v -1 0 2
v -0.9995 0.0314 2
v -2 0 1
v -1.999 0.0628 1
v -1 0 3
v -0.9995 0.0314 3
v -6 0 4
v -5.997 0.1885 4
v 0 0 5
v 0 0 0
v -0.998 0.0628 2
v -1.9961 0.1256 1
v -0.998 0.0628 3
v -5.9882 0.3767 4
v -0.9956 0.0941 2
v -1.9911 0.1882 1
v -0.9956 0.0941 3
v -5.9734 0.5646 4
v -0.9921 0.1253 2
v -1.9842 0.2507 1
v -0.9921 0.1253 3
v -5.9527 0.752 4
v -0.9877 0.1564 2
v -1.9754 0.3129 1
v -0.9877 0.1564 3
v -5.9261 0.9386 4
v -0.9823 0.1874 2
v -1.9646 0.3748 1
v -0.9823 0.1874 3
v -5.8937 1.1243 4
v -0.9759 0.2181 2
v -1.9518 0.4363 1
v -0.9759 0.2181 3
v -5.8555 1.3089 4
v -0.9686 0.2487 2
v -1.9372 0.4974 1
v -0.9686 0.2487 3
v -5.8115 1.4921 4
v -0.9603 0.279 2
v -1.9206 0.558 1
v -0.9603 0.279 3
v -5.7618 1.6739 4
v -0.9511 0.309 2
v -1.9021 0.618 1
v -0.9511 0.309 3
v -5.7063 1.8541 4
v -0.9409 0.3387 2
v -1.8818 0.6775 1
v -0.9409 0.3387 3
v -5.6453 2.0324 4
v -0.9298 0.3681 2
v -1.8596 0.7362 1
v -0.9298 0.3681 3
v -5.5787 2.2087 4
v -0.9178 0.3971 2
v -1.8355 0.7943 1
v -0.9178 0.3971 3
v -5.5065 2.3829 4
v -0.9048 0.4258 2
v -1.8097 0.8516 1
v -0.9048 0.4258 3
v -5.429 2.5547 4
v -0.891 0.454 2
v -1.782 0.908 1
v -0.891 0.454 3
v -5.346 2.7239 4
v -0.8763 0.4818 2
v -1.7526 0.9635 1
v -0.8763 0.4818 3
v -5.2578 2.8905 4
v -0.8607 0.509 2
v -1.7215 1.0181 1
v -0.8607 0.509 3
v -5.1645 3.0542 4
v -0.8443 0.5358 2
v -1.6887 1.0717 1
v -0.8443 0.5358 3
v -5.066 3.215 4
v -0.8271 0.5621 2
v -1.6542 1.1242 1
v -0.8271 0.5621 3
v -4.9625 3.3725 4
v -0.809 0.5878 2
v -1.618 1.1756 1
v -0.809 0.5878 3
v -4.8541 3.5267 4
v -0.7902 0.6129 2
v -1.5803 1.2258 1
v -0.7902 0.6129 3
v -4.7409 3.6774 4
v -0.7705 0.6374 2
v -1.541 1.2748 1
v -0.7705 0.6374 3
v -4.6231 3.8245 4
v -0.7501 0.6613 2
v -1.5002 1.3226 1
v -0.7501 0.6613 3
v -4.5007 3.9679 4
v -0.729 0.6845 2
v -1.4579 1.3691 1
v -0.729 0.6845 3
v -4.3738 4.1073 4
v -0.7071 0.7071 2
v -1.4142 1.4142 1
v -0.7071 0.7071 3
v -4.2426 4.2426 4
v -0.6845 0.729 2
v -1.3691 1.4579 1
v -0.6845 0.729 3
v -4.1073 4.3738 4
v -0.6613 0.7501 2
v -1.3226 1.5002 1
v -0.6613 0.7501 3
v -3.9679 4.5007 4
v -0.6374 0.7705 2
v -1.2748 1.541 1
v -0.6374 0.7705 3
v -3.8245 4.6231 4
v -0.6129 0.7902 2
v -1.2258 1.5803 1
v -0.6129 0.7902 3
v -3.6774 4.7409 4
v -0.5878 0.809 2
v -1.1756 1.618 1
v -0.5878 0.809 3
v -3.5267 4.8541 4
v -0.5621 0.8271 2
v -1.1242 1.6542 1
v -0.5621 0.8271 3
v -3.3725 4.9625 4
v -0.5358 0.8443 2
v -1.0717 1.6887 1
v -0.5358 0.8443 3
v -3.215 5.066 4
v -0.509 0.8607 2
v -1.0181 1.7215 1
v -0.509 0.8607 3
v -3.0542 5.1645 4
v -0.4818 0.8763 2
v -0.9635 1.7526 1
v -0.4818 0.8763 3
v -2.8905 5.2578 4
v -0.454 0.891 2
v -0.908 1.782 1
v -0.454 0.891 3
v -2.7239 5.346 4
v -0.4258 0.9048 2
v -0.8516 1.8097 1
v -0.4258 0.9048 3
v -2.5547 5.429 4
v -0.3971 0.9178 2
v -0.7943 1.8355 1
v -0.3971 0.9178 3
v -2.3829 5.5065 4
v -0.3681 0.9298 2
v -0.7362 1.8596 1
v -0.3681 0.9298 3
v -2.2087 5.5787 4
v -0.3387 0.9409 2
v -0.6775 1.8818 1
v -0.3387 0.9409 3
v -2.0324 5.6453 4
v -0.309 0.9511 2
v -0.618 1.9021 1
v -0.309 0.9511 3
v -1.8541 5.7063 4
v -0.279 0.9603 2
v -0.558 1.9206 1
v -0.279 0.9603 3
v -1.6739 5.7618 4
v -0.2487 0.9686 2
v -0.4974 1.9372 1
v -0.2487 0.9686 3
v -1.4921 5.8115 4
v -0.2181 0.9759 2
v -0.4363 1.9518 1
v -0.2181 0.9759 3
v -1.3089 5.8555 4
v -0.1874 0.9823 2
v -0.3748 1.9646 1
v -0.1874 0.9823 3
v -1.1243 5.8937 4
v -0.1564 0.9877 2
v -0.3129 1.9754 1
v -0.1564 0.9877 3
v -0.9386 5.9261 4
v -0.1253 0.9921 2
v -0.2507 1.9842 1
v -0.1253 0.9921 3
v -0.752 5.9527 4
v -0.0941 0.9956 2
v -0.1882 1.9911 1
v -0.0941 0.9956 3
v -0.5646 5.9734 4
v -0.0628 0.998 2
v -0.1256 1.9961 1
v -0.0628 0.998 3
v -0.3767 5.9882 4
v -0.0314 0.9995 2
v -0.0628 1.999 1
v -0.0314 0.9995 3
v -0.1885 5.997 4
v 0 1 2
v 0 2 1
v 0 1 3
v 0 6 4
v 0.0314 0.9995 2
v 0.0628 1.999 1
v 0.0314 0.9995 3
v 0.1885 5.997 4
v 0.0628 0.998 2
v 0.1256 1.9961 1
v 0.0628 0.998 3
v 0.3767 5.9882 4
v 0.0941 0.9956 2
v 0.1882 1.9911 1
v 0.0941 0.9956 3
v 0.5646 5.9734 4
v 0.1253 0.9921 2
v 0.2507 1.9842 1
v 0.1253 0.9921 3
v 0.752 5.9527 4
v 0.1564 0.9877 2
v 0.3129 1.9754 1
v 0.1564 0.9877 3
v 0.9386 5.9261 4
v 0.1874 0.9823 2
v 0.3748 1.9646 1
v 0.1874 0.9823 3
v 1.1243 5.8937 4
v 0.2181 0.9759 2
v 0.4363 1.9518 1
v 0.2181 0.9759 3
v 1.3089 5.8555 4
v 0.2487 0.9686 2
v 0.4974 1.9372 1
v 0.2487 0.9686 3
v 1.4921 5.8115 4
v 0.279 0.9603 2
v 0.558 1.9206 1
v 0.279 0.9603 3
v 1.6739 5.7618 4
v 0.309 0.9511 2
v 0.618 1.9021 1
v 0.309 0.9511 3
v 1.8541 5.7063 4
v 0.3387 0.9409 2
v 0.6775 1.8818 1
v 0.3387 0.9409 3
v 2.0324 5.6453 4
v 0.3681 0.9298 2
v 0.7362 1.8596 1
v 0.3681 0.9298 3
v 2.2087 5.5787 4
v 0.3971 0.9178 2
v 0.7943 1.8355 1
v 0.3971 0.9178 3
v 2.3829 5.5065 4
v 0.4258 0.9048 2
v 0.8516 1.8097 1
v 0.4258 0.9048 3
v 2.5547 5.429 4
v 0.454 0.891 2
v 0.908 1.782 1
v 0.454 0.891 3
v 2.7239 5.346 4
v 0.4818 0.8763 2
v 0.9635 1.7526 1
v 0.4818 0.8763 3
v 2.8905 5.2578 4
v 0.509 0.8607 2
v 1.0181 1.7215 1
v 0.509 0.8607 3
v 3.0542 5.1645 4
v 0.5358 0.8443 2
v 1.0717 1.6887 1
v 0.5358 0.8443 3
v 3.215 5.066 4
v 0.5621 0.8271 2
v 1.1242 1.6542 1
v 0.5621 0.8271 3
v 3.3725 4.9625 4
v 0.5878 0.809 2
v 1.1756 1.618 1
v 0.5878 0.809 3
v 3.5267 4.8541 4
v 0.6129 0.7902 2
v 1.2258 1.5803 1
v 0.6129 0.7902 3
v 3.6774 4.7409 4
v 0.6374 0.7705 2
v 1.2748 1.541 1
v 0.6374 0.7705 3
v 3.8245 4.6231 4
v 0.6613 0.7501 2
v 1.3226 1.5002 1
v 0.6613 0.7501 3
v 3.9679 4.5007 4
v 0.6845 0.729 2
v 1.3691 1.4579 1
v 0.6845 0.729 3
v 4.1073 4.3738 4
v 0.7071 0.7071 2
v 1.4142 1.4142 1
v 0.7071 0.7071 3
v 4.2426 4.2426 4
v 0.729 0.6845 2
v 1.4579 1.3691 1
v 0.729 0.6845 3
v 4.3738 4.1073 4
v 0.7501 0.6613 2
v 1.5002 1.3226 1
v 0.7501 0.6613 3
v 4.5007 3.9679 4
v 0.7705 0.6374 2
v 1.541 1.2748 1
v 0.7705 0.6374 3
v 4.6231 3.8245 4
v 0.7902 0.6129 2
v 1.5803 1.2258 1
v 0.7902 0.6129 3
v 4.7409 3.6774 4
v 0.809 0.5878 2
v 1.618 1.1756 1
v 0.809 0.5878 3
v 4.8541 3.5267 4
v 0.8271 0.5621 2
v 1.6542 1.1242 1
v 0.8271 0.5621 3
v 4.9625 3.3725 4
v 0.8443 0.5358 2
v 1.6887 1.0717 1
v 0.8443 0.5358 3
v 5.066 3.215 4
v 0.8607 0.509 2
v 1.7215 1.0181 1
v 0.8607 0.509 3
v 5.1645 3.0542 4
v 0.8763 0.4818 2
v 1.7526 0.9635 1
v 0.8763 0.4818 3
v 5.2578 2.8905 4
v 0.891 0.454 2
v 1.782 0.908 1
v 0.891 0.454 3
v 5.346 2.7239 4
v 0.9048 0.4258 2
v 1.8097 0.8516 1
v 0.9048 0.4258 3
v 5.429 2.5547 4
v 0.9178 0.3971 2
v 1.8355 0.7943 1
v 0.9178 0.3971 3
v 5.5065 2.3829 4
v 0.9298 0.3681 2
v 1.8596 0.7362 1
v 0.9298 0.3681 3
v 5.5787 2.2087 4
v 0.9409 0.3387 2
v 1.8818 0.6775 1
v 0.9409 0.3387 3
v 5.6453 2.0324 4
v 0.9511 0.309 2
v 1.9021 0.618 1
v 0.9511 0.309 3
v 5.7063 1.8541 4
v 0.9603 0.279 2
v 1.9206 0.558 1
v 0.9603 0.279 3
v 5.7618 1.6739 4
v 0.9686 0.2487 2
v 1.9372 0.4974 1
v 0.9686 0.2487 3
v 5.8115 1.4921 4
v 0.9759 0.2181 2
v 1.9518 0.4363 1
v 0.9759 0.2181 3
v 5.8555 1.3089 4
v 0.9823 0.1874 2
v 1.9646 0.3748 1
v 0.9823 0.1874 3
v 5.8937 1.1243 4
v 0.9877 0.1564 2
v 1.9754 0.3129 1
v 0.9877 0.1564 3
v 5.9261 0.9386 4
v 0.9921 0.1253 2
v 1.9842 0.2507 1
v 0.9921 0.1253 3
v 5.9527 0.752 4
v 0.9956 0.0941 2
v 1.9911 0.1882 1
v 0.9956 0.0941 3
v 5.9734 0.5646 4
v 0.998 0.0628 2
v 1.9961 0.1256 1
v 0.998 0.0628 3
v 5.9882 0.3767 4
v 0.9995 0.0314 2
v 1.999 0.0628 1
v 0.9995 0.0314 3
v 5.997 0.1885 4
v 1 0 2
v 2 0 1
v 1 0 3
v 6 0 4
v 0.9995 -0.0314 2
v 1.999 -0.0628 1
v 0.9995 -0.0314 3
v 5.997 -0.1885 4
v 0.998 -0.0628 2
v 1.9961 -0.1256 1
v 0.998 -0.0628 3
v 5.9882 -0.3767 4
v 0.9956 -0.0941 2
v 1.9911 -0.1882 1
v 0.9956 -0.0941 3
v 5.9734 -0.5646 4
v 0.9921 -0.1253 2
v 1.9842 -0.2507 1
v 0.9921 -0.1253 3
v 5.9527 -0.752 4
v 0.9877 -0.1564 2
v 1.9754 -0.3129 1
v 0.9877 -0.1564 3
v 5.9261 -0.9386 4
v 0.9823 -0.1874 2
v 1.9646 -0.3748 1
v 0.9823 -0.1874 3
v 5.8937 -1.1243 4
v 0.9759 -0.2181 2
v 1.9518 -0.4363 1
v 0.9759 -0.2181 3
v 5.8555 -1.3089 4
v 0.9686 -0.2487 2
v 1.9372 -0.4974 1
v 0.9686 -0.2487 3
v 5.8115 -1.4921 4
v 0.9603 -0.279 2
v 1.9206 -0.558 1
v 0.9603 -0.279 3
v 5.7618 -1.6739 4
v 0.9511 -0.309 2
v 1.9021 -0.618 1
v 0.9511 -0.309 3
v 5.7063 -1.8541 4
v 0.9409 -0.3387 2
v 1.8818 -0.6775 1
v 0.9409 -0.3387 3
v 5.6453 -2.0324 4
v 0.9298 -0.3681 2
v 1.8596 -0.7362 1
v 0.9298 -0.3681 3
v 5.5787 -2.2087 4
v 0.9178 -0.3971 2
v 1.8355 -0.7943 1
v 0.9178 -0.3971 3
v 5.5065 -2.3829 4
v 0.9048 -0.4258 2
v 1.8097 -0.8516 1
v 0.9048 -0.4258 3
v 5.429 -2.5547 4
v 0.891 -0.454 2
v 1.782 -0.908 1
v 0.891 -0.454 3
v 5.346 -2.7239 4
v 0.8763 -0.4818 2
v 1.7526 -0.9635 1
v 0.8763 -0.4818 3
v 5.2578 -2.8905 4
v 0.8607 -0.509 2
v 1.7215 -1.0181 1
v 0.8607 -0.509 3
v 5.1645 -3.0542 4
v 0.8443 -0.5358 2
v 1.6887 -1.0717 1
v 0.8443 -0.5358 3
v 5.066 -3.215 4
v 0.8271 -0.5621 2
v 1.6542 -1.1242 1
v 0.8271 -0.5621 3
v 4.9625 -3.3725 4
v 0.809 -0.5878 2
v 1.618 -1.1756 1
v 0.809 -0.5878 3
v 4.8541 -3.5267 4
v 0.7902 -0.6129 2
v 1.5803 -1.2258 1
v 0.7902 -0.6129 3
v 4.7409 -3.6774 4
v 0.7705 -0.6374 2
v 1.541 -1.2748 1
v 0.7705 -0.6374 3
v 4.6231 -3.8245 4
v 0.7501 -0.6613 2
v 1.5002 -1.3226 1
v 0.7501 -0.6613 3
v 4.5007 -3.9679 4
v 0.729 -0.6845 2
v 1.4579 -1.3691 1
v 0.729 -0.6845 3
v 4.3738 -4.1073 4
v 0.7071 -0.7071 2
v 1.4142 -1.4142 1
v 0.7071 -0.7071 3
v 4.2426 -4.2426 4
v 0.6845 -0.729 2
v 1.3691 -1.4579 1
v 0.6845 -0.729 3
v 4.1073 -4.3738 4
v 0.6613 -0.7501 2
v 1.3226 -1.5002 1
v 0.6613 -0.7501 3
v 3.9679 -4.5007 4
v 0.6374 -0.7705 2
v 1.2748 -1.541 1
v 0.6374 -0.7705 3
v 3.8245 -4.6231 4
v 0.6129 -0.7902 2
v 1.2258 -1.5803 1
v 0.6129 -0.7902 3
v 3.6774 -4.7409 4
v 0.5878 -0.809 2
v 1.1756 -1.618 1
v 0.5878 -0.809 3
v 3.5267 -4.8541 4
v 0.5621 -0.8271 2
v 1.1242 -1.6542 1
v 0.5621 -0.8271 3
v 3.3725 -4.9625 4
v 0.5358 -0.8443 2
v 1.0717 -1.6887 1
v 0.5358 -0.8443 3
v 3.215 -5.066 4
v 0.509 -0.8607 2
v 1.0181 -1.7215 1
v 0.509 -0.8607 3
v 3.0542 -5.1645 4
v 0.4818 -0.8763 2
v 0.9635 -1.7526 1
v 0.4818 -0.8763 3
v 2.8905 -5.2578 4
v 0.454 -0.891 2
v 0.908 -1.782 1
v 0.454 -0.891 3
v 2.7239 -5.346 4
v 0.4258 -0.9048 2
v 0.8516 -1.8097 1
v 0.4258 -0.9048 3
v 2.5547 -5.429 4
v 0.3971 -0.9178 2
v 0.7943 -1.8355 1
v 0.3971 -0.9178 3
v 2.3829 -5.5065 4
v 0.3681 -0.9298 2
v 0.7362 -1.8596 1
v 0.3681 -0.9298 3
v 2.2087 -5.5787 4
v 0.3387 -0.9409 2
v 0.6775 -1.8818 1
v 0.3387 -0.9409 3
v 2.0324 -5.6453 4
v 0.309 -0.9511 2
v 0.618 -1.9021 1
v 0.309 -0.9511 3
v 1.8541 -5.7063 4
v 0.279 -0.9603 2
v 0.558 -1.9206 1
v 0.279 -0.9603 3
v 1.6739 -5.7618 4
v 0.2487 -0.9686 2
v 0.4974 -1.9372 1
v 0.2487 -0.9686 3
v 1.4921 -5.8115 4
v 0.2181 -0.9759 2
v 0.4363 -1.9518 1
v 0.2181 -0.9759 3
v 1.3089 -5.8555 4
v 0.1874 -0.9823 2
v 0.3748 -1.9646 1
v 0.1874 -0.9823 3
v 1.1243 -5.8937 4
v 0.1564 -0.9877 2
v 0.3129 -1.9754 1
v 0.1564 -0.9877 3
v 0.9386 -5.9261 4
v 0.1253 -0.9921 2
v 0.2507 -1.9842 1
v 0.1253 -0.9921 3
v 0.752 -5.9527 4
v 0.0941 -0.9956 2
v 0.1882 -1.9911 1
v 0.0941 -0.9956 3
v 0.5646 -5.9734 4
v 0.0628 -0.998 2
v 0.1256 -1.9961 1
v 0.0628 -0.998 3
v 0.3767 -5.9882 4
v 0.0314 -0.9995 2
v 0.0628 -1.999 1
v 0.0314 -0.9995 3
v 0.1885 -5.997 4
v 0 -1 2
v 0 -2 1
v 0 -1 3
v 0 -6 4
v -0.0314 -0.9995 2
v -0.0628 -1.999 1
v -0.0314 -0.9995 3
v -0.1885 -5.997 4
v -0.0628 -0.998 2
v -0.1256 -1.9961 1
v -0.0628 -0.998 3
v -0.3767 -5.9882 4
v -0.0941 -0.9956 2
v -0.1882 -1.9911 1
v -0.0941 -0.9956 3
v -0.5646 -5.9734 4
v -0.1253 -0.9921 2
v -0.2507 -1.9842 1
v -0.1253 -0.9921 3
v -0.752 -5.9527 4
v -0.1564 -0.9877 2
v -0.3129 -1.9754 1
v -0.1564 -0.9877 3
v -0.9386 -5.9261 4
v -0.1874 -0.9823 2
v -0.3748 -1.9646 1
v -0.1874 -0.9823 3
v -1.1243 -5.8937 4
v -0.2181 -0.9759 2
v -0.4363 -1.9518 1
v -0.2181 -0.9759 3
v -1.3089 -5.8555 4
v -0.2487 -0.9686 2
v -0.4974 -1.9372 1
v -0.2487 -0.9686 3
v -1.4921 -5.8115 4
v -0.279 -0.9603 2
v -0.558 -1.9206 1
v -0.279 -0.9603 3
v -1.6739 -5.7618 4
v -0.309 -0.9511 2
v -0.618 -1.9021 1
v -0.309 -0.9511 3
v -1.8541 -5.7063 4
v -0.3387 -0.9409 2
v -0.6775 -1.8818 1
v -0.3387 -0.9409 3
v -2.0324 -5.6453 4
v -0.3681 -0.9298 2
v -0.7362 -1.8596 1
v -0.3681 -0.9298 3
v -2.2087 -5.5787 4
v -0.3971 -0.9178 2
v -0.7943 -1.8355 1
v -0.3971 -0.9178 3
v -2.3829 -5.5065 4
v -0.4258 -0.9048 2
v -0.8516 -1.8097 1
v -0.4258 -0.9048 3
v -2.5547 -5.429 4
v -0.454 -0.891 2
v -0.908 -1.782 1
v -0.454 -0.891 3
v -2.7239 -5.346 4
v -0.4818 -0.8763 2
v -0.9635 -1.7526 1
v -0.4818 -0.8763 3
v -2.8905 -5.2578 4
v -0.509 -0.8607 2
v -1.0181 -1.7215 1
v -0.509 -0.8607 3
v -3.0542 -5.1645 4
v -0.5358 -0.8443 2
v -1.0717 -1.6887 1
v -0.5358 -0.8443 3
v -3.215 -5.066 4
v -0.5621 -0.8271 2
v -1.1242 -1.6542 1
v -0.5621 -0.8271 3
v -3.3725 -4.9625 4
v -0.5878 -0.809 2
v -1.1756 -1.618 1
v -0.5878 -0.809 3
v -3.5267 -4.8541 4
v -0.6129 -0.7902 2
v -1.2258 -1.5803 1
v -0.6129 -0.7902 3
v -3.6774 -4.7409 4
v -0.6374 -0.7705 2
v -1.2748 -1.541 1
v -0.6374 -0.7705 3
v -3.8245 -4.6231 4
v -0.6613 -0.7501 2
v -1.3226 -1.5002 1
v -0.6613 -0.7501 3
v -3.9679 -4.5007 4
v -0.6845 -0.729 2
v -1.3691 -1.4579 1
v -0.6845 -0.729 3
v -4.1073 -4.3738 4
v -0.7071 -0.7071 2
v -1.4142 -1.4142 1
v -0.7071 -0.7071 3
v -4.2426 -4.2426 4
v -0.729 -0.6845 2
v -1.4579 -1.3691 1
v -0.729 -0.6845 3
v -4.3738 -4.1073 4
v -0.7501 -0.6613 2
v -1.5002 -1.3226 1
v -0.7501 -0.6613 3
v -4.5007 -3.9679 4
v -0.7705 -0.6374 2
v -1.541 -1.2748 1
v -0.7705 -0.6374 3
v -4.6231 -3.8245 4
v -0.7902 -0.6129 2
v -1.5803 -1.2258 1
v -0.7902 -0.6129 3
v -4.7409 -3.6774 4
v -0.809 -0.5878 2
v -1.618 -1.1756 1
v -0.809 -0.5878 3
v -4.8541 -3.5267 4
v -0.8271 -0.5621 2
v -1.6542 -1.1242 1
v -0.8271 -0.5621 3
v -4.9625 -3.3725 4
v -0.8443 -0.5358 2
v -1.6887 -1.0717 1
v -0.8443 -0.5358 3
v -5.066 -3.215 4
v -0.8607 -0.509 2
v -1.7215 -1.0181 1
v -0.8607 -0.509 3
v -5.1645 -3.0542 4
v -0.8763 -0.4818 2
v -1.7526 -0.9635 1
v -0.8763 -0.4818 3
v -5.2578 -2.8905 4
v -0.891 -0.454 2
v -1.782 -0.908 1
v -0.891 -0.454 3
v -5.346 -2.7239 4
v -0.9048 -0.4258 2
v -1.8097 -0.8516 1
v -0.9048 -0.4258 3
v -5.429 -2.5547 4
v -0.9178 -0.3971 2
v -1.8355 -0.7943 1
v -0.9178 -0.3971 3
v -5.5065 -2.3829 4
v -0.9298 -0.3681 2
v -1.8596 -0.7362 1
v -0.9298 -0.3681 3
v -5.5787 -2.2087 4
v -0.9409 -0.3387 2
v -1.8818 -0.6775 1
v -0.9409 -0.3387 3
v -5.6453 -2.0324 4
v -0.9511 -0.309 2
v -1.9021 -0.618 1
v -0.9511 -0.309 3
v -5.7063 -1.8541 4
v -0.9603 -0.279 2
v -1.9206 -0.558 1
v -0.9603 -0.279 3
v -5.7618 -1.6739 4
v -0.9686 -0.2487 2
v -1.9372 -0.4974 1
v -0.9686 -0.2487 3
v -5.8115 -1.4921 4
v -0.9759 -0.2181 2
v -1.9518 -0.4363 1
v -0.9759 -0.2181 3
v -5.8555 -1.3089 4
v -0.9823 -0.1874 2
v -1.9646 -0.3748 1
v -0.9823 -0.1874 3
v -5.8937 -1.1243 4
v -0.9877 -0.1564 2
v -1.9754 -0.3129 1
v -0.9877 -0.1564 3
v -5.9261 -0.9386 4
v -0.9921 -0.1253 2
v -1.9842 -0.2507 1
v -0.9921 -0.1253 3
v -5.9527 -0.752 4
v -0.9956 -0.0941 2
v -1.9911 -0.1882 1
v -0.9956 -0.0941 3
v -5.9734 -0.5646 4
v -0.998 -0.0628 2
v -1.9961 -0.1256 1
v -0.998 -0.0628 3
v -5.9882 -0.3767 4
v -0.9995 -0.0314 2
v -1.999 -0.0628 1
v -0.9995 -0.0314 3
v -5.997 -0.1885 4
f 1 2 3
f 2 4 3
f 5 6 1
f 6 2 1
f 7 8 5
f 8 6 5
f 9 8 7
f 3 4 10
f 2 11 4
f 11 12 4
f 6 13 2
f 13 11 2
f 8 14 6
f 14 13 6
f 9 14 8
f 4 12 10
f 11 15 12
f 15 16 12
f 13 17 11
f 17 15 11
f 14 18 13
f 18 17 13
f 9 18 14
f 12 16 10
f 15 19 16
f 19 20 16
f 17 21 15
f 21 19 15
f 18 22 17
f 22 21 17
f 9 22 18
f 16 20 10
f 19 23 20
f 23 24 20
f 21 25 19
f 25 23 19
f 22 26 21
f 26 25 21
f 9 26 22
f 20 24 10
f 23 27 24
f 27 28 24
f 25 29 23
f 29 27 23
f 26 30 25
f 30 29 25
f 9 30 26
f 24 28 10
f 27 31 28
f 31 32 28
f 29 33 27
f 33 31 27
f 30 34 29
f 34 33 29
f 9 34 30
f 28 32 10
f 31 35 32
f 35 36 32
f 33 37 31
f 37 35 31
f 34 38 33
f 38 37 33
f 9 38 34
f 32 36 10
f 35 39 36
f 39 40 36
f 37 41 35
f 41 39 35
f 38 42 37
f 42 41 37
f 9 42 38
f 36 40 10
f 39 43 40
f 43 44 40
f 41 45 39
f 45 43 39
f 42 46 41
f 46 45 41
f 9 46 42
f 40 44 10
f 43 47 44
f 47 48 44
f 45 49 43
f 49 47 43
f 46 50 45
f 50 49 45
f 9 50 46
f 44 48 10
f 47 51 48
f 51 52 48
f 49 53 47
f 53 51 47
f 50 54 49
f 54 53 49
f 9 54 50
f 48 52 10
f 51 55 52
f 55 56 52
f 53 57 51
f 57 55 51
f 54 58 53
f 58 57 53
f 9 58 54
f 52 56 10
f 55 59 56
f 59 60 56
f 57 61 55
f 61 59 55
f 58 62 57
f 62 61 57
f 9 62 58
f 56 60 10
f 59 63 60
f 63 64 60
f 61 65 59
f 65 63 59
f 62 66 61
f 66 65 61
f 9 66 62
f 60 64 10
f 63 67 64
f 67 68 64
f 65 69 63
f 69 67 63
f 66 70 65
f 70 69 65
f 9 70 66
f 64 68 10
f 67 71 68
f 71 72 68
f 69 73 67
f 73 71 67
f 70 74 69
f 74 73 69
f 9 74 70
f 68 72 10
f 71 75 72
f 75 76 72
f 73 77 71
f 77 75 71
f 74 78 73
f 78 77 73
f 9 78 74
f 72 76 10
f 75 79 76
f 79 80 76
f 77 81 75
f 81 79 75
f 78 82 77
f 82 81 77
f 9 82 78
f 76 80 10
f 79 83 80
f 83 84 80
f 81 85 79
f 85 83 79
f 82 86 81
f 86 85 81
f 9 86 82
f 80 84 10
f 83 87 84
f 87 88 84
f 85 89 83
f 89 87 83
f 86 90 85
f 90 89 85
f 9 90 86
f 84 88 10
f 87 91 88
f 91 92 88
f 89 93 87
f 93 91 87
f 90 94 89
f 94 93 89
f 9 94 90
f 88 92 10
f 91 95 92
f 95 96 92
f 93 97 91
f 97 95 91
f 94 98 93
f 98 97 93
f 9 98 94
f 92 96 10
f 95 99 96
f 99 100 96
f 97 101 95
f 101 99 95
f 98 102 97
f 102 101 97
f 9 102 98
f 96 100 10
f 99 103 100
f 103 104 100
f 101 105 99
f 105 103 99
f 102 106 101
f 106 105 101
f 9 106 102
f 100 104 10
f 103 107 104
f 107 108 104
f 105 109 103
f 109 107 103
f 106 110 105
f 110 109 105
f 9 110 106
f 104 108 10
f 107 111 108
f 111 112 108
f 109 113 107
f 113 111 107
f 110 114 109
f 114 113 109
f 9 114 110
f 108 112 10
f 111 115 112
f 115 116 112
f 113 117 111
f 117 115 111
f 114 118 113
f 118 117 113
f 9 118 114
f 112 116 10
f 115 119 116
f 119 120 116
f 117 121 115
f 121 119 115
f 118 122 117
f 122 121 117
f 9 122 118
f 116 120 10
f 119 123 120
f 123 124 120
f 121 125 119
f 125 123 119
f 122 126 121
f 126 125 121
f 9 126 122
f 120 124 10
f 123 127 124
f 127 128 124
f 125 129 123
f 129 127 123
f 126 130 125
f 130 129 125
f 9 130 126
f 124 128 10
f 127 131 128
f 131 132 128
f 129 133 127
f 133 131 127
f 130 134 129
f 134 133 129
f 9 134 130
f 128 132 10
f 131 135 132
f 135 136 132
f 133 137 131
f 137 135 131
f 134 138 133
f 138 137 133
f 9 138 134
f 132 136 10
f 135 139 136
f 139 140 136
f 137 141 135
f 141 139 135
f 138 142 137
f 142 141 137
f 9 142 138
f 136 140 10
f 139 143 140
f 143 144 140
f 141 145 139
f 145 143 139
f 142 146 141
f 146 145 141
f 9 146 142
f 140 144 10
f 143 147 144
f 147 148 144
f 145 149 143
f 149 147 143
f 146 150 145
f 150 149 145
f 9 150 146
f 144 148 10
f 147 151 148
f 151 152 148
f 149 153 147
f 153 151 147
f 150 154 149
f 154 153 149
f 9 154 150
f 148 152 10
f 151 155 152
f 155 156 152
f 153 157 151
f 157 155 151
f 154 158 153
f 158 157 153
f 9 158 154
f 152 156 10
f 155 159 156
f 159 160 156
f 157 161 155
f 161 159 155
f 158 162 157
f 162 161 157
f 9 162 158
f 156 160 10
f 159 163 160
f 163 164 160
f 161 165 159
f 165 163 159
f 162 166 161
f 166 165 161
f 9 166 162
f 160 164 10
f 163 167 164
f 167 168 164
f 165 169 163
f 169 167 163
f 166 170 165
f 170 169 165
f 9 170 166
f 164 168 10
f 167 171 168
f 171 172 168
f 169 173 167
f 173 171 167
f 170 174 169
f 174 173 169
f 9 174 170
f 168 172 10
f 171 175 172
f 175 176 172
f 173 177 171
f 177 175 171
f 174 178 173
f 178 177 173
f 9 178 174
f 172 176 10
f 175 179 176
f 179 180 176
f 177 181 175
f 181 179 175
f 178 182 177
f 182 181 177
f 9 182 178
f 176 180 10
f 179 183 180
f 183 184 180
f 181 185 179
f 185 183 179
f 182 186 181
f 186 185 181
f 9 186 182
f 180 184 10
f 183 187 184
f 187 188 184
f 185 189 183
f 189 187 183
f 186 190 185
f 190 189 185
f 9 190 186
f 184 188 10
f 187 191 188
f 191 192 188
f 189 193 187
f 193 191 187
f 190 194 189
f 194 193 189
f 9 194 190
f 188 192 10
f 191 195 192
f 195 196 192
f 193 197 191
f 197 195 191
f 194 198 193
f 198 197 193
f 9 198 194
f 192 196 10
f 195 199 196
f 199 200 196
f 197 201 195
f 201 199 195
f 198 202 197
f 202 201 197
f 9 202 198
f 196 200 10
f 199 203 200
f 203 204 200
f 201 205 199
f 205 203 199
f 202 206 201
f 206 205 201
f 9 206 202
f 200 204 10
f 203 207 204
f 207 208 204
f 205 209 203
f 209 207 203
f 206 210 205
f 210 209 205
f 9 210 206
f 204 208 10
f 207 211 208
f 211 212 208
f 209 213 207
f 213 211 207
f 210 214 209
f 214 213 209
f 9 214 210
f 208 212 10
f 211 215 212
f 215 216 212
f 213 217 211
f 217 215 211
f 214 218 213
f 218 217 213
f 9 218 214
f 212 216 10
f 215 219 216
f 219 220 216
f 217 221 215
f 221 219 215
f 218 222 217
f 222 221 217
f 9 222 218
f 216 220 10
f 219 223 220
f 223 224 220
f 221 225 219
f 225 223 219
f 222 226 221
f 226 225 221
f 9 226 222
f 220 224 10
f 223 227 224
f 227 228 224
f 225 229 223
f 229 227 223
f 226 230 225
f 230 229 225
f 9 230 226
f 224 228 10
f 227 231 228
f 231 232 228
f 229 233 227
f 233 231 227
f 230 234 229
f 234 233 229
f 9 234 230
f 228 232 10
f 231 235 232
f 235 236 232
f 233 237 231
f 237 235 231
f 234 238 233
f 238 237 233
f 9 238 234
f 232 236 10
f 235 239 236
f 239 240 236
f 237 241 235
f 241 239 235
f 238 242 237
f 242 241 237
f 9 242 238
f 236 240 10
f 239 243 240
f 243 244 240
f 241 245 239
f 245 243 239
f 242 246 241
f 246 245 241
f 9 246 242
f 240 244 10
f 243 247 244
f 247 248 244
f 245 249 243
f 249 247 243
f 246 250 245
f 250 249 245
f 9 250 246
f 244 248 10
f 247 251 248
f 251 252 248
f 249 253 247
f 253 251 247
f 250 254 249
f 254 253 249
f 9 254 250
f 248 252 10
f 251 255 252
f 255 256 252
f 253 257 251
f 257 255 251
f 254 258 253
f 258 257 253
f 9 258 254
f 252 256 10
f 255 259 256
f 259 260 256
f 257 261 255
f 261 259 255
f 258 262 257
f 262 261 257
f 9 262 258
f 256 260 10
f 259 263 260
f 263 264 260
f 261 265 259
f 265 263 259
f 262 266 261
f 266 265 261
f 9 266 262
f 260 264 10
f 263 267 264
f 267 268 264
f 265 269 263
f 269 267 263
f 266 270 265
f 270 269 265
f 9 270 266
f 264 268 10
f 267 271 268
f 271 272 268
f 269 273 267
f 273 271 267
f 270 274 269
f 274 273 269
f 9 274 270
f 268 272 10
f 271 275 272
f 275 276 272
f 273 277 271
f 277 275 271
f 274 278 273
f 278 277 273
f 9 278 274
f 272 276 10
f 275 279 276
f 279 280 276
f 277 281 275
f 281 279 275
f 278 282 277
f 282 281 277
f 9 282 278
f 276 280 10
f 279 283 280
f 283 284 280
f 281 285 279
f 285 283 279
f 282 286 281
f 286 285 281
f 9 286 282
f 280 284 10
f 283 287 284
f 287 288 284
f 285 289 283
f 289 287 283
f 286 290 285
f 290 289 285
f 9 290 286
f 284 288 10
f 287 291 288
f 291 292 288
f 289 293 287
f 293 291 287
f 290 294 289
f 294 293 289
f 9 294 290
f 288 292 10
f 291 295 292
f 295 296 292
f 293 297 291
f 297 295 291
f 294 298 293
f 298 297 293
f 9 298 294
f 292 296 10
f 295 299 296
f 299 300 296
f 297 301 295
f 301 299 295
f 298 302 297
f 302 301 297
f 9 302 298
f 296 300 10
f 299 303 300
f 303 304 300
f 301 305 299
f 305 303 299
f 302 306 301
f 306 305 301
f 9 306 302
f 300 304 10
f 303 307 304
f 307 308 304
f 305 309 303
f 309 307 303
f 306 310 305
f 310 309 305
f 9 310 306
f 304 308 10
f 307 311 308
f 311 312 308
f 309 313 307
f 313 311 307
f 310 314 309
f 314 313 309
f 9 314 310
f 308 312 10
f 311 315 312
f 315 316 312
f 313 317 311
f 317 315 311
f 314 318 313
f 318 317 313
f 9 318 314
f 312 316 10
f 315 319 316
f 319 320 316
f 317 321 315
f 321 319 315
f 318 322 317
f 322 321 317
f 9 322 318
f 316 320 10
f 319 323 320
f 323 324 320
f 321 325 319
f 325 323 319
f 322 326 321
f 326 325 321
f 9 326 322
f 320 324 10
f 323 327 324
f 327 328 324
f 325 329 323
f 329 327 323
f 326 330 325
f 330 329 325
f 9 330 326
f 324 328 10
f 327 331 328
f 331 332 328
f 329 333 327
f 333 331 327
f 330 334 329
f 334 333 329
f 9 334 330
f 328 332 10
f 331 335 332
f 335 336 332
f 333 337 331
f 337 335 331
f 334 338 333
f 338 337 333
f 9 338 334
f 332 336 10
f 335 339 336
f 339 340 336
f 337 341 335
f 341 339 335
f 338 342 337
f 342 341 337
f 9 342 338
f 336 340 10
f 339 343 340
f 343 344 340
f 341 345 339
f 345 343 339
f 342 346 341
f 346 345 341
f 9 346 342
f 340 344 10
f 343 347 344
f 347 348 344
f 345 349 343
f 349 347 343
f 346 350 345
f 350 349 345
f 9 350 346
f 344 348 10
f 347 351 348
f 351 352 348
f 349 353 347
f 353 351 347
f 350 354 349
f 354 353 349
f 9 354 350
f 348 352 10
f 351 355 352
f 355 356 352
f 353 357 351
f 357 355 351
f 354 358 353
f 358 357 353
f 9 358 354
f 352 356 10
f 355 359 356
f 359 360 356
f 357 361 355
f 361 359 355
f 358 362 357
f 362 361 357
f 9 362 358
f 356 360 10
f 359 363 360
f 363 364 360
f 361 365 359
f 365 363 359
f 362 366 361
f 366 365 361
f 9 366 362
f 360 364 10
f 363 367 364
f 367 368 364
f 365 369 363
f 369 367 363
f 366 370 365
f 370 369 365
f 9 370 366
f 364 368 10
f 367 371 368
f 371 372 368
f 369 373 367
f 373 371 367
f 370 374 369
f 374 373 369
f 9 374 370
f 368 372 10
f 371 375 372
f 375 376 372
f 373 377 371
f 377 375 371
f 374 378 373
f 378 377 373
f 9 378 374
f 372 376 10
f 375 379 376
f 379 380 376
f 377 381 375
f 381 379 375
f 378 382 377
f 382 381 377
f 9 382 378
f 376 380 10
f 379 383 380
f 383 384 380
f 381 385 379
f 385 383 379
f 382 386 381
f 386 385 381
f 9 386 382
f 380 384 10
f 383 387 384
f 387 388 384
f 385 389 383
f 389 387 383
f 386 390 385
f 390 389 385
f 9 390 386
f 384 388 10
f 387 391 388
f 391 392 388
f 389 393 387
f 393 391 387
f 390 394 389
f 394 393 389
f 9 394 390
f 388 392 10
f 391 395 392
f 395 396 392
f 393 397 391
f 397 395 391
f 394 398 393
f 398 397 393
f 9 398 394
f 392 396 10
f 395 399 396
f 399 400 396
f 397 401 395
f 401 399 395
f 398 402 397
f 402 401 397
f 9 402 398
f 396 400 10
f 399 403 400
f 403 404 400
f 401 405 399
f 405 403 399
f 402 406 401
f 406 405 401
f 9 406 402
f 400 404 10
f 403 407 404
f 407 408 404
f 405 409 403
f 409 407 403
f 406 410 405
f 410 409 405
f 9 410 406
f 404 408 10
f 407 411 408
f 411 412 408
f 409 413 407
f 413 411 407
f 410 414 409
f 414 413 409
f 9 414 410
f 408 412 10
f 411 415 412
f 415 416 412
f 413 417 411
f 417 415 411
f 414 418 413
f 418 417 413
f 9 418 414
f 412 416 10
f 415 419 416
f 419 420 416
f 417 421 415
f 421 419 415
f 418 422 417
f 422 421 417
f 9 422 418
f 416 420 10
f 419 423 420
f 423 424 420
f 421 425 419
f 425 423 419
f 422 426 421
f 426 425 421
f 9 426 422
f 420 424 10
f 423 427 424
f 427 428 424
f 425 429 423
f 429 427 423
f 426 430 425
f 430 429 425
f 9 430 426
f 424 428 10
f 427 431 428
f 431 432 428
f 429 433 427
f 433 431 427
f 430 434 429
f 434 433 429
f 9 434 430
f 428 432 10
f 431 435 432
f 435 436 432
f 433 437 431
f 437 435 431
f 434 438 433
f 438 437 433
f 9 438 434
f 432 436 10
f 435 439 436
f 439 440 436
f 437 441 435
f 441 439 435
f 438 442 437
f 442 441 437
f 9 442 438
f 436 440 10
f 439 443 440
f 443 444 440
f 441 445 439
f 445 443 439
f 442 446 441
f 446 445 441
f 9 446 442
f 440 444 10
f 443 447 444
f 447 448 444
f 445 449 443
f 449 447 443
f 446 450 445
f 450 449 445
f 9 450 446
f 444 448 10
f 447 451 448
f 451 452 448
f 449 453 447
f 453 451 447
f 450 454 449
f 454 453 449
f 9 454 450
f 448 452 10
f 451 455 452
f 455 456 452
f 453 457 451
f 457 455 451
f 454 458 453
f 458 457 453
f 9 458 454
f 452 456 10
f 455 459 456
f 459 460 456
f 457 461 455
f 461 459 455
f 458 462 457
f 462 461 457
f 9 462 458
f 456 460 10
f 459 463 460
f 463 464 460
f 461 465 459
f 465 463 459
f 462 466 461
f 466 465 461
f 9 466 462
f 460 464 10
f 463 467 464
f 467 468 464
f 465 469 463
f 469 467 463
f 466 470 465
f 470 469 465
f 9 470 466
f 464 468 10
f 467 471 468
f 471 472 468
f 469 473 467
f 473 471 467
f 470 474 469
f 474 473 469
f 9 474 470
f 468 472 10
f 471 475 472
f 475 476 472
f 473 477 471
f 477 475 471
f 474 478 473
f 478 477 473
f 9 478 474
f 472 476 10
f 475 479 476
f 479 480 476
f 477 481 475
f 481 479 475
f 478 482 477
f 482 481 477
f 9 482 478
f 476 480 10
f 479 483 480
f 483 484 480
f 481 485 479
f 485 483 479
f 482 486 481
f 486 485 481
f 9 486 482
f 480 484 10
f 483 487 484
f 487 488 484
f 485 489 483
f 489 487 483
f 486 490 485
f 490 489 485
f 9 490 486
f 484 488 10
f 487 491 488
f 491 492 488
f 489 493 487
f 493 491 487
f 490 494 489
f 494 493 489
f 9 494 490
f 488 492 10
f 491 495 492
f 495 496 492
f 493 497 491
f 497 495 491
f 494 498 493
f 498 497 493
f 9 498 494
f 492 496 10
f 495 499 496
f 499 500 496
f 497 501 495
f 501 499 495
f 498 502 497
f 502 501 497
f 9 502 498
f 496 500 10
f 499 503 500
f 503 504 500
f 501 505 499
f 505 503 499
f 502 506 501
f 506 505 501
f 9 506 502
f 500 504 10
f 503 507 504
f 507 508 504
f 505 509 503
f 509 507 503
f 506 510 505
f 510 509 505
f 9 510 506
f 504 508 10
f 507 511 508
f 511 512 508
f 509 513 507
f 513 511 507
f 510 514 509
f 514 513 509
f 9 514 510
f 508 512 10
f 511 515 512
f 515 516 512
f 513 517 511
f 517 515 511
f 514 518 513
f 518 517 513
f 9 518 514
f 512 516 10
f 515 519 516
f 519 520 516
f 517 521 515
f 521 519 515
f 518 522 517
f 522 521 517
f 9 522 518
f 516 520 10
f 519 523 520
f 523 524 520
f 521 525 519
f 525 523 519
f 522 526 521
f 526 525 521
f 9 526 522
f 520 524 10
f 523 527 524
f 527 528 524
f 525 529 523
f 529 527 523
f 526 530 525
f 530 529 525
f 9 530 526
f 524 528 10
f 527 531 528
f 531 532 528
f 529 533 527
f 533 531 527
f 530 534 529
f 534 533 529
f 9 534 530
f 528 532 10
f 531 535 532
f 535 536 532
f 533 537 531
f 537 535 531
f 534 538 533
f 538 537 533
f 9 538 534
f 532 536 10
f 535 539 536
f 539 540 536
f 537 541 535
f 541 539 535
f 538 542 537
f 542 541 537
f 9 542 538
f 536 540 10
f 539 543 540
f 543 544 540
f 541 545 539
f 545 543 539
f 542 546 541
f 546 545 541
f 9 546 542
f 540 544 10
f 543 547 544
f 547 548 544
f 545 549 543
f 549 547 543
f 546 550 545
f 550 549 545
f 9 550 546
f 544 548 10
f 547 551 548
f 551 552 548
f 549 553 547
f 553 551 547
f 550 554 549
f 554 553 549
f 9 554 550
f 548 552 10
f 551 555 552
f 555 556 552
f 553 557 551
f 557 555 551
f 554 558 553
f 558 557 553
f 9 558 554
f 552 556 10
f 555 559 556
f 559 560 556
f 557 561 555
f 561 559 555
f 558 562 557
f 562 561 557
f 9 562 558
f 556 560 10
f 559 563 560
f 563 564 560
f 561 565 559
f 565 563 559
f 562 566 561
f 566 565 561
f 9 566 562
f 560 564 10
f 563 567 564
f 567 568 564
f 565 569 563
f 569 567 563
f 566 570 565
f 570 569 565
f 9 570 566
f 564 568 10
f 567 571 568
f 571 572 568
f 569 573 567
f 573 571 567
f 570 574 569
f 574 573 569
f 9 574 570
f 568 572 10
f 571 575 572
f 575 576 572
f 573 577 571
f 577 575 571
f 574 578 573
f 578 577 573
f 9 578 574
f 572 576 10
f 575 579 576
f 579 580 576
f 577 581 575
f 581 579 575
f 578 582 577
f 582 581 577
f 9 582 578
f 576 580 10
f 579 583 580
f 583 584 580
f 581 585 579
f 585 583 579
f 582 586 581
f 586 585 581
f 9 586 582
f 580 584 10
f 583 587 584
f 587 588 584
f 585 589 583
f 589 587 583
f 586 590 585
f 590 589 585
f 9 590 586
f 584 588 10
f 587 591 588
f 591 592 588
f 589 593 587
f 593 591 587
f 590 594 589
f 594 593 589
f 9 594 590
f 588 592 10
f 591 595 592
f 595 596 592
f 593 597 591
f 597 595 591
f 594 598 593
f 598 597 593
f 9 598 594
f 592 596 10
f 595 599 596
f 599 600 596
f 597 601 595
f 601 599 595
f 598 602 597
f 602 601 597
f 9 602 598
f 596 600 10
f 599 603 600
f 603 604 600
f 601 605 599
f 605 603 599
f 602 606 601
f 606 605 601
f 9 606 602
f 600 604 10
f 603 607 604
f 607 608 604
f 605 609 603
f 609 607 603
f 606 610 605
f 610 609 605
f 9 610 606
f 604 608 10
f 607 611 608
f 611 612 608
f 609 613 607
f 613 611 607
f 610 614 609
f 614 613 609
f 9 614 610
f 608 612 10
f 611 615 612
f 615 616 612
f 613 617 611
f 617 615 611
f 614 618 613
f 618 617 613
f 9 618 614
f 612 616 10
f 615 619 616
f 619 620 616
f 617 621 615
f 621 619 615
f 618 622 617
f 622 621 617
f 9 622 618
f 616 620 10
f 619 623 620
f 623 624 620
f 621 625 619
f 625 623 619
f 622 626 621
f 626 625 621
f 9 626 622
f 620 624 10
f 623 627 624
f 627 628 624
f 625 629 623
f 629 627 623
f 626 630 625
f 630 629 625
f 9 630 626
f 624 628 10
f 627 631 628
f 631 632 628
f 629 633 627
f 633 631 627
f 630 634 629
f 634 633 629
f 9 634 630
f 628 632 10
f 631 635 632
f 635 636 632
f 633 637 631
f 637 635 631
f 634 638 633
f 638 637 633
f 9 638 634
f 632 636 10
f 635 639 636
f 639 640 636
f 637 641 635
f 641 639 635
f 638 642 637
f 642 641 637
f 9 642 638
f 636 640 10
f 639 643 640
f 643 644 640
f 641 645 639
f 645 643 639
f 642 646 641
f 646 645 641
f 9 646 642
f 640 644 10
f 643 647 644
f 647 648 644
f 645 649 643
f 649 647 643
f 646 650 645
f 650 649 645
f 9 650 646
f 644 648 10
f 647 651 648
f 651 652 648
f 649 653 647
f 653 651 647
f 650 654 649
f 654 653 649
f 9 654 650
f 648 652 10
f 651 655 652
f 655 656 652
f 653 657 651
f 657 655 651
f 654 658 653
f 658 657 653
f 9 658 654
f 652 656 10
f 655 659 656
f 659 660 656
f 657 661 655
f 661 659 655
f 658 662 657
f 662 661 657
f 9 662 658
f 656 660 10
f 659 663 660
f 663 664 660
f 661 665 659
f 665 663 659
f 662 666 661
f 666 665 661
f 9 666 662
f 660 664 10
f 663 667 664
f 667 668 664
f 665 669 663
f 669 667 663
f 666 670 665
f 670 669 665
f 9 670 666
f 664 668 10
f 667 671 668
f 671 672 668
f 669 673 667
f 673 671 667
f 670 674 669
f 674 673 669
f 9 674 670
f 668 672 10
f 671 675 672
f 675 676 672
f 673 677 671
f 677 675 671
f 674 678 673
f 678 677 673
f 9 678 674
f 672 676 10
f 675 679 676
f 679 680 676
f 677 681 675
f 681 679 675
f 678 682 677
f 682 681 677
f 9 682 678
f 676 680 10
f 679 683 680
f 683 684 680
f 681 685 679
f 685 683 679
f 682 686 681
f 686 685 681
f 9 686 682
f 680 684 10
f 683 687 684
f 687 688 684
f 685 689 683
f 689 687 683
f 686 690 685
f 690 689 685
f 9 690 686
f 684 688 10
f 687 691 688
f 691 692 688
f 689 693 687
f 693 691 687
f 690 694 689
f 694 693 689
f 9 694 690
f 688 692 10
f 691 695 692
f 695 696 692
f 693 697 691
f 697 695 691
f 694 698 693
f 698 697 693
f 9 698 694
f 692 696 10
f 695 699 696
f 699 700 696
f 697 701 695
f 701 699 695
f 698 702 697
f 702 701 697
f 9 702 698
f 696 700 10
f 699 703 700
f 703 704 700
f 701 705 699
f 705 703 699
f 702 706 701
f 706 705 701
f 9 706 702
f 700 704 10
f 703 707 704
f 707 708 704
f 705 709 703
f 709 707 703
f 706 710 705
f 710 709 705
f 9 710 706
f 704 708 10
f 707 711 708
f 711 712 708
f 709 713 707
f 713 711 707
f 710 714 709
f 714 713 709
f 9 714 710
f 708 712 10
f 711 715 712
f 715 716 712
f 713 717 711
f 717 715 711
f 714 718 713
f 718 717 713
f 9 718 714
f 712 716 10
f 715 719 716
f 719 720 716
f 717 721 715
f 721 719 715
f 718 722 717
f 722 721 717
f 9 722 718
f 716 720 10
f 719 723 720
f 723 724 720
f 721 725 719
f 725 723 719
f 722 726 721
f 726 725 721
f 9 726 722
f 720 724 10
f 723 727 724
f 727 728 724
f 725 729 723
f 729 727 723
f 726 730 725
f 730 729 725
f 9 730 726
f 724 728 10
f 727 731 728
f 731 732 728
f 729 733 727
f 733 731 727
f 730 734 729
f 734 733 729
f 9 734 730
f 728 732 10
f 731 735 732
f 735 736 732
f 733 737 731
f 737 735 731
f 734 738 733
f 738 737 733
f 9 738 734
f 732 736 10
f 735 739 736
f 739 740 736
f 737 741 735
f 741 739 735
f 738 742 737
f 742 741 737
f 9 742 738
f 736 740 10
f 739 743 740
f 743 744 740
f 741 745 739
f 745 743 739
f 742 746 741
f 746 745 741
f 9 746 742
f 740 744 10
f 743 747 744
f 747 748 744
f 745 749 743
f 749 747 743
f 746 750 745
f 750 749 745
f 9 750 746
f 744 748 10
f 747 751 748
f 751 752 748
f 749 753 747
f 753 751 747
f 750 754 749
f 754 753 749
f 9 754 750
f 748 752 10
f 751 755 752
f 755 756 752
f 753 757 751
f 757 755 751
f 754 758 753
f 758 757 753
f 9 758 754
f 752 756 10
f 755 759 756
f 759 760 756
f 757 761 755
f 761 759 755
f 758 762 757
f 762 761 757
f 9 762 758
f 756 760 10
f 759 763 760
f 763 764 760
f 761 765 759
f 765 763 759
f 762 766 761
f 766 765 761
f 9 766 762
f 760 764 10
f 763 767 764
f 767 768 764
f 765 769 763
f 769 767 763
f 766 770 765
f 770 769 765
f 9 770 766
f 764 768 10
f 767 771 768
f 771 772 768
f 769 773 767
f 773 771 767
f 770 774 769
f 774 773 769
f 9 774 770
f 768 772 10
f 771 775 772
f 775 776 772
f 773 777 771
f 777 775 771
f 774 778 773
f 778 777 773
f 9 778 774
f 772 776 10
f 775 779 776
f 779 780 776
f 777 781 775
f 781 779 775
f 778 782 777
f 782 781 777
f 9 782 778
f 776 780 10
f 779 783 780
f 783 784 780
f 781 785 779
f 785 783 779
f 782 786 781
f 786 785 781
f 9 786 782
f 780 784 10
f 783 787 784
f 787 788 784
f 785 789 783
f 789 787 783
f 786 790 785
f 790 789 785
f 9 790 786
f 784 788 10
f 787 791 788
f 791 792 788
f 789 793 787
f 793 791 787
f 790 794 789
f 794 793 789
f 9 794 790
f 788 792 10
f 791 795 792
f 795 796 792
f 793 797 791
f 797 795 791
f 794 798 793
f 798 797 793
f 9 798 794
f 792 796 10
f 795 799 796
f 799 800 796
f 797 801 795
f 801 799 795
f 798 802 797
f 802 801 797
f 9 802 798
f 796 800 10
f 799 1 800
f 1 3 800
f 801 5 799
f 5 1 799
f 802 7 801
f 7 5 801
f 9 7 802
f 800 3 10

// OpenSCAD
module ruspot(lenght = 100, width = 100, height = 100) {
    
    density = 5;
    
    rotate_extrude($fn=200) polygon( points=[[0,0],[2,1],[1,2],[1,3],[6,4],[0,5]] );
    
  /*  
     intersection_for(i = [ [  133,  12,   100],
 			[ 10, 20, 300],
 			[100, 40,  57],
 			[ 20, 88,  57] ])
{
    rotate(i)
    cube([100, 20, 20], center = true);
}
*/
    
        //rotate_extrude(convexity = 10)
        //translate([4, 0, 0])
        //circle(r=1);
    /*
    translate([0,60,0])
   rotate_extrude(angle=270, convexity=10)
       translate([40, 0]) circle(10);
rotate_extrude(angle=90, convexity=10)
   translate([20, 0]) circle(10);
translate([20,0,0]) 
   rotate([90,0,0]) cylinder(r=10,h=80);
    */
    /*
        difference() {
            cube([lenght, width, height], true);
            translate([-((density*lenght)/100), -((density*width)/100), -((density*height)/100)]) {
                cube([lenght-density, width-density, height-density], true);
            }
            
        }
    */
}

ruspot(200, 200, 200);
